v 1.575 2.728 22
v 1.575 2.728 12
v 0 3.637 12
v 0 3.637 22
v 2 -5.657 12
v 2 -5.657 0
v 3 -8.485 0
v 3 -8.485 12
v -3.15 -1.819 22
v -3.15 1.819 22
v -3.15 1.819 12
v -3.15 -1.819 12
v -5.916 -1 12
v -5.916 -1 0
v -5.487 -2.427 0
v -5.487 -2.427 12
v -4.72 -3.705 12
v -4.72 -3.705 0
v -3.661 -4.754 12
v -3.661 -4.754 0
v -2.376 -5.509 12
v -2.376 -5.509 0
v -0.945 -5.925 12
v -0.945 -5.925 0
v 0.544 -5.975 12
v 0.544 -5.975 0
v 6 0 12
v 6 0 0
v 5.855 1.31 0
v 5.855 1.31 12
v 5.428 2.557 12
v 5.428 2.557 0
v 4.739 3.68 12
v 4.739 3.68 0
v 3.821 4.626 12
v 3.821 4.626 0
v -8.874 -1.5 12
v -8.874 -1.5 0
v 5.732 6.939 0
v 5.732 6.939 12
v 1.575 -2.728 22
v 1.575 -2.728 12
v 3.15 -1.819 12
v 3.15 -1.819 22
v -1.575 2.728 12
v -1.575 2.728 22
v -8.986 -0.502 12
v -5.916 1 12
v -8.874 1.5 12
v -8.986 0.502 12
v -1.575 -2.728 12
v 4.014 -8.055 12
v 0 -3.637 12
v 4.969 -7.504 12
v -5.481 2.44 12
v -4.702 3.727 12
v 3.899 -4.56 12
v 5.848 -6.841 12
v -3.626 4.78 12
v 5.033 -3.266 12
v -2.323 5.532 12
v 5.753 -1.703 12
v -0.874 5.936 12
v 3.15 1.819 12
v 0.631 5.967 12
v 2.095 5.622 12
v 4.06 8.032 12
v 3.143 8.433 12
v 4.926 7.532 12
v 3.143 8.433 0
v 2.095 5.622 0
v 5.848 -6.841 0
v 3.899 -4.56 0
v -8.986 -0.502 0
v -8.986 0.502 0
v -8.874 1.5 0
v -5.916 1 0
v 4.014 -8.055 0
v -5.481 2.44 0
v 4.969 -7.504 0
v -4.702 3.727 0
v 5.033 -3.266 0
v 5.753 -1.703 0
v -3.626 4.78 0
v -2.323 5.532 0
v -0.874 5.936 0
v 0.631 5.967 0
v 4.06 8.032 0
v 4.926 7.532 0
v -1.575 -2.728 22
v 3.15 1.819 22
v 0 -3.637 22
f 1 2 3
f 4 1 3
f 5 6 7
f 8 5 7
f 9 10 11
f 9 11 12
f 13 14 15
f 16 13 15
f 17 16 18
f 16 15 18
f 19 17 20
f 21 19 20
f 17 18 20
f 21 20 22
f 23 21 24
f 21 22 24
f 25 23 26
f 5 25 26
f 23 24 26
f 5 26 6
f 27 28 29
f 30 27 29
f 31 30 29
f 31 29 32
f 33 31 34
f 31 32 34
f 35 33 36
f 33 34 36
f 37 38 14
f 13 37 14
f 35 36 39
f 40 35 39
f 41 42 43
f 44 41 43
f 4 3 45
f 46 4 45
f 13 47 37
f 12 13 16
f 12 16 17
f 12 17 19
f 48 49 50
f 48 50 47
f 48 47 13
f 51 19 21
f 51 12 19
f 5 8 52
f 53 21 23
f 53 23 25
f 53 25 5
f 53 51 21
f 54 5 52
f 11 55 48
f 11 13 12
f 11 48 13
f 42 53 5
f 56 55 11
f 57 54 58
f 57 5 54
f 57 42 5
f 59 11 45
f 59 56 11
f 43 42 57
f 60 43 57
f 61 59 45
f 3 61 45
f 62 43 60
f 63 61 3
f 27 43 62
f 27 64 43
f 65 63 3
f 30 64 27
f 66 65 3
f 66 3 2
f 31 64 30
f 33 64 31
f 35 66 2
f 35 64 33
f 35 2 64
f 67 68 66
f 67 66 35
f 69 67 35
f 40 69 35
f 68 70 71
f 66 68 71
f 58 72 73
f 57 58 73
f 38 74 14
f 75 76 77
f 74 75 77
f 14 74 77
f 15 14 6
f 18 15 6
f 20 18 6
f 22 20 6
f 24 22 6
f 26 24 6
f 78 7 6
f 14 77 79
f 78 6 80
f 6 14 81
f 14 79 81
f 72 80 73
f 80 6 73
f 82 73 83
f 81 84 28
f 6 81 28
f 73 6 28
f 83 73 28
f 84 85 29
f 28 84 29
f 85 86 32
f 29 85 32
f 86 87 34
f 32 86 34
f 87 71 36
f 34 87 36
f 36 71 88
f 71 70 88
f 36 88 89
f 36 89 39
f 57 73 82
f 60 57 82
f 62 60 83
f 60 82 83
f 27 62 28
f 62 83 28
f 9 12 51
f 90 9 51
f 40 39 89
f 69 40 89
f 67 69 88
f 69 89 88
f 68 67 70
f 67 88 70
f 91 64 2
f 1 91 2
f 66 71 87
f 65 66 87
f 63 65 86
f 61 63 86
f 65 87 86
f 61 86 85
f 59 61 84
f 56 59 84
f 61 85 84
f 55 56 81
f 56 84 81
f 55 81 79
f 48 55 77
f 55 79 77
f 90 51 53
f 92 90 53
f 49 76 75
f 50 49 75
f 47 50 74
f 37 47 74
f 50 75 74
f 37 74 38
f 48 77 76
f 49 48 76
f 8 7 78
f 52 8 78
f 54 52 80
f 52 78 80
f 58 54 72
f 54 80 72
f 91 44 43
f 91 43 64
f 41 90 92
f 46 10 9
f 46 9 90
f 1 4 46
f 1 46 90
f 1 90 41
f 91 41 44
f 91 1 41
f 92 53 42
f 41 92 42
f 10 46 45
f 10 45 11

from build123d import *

# Parameters (mm, degrees)
F1_DEPTH = 12
F3_DEPTH = 10


with BuildPart() as f1:
    # F0 (on Top) → F1 (new body)
    with BuildSketch(Plane.XY):
        with BuildLine():
            Line((-5.9160797831, 1), (-8.8741196746, 1.5))
            ThreePointArc((-8.8741196746, 1.5), (-9, 0), (-8.8741196746, -1.5))
            Line((-8.8741196746, -1.5), (-5.9160797831, -1))
            ThreePointArc((-5.9160797831, -1), (-6, 0), (-5.9160797831, 1))
        make_face()
        with BuildLine():
            ThreePointArc((6, 0), (5.4280787943, 2.5565524839), (3.8213464657, 4.6257227748))
            ThreePointArc((3.8213464657, 4.6257227748), (3, 5.1961524227), (2.0953202009, 5.6222445034))
            ThreePointArc((2.0953202009, 5.6222445034), (-2.9984724458, 5.1970340572), (-5.9160797831, 1))
            ThreePointArc((-5.9160797831, 1), (-6, 0), (-5.9160797831, -1))
            ThreePointArc((-5.9160797831, -1), (-3.0422841899, -5.1715091519), (2, -5.6568542495))
            ThreePointArc((2, -5.6568542495), (3, -5.1961524227), (3.8989794856, -4.5604779323))
            ThreePointArc((3.8989794856, -4.5604779323), (5.4494897428, -2.5105898796), (6, 0))
        make_face()
        with BuildLine():
            Line((3.8213464657, 4.6257227748), (5.7320196986, 6.9385841621))
            ThreePointArc((5.7320196986, 6.9385841621), (4.5, 7.7942286341), (3.1429803014, 8.433366755))
            Line((3.1429803014, 8.433366755), (2.0953202009, 5.6222445034))
            ThreePointArc((2.0953202009, 5.6222445034), (3, 5.1961524227), (3.8213464657, 4.6257227748))
        make_face()
        with BuildLine():
            ThreePointArc((3, -8.4852813742), (4.5, -7.7942286341), (5.8484692283, -6.8407168985))
            Line((5.8484692283, -6.8407168985), (3.8989794856, -4.5604779323))
            ThreePointArc((3.8989794856, -4.5604779323), (3, -5.1961524227), (2, -5.6568542495))
            Line((2, -5.6568542495), (3, -8.4852813742))
        make_face()
    extrude(amount=F1_DEPTH)

    # F2 (on face) → F3 (join)
    with BuildSketch(Plane.XY.offset(12)):
        with BuildLine():
            ThreePointArc((1.5750000902, -2.7279799699), (2.727980048, -1.5749999549), (3.15, 0))
            ThreePointArc((3.15, 0), (2.7279800298, 1.5749999864), (1.5750000272, 2.7279800062))
            ThreePointArc((1.5750000272, 2.7279800062), (1.5e-08, 3.15), (-1.5750000013, 2.7279800212))
            ThreePointArc((-1.5750000013, 2.7279800212), (-2.7279800223, 1.5749999993), (-3.15, 0))
            ThreePointArc((-3.15, 0), (-2.7279800223, -1.5749999993), (-1.5750000013, -2.7279800212))
            ThreePointArc((-1.5750000013, -2.7279800212), (5.13e-08, -3.15), (1.5750000902, -2.7279799699))
        make_face()
        with BuildLine():
            Line((3.15, -1.8186533479), (3.15, 0))
            ThreePointArc((3.15, 0), (2.727980048, -1.5749999549), (1.5750000902, -2.7279799699))
            Line((1.5750000902, -2.7279799699), (3.15, -1.8186533479))
        make_face()
        with BuildLine():
            ThreePointArc((1.5750000272, 2.7279800062), (2.7279800298, 1.5749999864), (3.15, 0))
            Line((3.15, 0), (3.15, 1.8186533479))
            Line((3.15, 1.8186533479), (1.5750000272, 2.7279800062))
        make_face()
        with BuildLine():
            ThreePointArc((-1.5750000013, 2.7279800212), (1.5e-08, 3.15), (1.5750000272, 2.7279800062))
            Line((1.5750000272, 2.7279800062), (0, 3.6373066959))
            Line((0, 3.6373066959), (-1.5750000013, 2.7279800212))
        make_face()
        with BuildLine():
            Line((0, -3.6373066959), (1.5750000902, -2.7279799699))
            ThreePointArc((1.5750000902, -2.7279799699), (5.13e-08, -3.15), (-1.5750000013, -2.7279800212))
            Line((-1.5750000013, -2.7279800212), (0, -3.6373066959))
        make_face()
        with BuildLine():
            ThreePointArc((-3.15, 0), (-2.7279800223, 1.5749999993), (-1.5750000013, 2.7279800212))
            Line((-1.5750000013, 2.7279800212), (-3.15, 1.8186533479))
            Line((-3.15, 1.8186533479), (-3.15, 0))
        make_face()
        with BuildLine():
            Line((-3.15, -1.8186533479), (-1.5750000013, -2.7279800212))
            ThreePointArc((-1.5750000013, -2.7279800212), (-2.7279800223, -1.5749999993), (-3.15, 0))
            Line((-3.15, 0), (-3.15, -1.8186533479))
        make_face()
    extrude(amount=F3_DEPTH)


solid = f1.part
